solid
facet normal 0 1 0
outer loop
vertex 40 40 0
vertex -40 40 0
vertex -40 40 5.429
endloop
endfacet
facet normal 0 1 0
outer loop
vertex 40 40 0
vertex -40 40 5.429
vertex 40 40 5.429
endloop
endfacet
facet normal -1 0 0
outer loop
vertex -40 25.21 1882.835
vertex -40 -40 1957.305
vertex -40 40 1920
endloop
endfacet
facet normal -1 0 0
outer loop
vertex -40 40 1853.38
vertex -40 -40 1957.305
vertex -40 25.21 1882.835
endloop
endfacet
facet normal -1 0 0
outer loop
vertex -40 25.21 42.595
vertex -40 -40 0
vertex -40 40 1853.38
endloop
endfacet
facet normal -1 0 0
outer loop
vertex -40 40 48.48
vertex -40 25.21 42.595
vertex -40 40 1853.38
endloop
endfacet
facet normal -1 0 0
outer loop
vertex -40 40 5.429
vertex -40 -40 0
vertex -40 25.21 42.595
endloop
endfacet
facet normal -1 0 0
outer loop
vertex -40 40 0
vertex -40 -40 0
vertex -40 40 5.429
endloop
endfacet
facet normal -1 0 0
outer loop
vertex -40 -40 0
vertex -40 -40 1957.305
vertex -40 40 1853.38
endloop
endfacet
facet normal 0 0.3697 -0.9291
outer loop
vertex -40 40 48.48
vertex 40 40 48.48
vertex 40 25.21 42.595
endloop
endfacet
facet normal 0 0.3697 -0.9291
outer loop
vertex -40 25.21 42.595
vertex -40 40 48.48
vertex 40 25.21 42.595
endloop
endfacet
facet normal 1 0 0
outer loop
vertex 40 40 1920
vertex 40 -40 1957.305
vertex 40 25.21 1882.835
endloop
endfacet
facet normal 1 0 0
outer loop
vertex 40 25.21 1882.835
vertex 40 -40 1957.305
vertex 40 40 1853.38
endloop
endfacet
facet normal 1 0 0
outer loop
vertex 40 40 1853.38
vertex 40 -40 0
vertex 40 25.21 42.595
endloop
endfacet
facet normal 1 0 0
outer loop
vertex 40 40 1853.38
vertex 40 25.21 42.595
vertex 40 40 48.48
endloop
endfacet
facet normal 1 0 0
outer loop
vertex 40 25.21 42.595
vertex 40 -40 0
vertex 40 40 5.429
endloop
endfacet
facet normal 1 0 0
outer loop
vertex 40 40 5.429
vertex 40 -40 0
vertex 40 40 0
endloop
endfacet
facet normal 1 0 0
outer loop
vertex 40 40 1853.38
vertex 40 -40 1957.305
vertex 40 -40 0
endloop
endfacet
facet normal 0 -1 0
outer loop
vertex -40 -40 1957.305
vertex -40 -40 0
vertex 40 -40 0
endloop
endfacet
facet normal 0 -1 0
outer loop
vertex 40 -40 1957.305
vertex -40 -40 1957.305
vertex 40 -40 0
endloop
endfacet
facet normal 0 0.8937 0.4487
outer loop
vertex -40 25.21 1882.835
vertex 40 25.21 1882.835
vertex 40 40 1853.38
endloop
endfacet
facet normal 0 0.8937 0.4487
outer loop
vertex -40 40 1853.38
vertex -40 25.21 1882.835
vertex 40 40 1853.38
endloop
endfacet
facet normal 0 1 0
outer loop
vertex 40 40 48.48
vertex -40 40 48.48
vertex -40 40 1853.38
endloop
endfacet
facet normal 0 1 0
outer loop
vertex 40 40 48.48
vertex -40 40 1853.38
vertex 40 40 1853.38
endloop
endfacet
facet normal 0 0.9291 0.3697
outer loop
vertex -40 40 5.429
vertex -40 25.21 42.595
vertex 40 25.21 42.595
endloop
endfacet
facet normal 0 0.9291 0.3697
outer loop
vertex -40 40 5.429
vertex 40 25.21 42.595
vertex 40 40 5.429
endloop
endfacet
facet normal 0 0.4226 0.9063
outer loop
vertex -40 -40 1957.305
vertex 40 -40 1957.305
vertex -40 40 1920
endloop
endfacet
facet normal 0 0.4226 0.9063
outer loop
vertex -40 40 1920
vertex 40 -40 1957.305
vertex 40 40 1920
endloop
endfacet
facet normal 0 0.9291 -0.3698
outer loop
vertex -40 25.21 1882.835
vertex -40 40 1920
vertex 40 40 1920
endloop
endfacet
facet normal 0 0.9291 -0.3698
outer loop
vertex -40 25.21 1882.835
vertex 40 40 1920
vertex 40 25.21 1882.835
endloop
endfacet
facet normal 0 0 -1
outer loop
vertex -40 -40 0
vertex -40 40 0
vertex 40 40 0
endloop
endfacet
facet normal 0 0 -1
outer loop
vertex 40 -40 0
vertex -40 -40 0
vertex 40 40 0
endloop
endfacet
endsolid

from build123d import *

# Parameters (mm, degrees)
F0_W     = 80
F0_H     = 80
F1_DEPTH = 2000
F3_DEPTH = 80.001


with BuildPart() as f1:
    # F0 (on Top) → F1 (new body)
    with BuildSketch(Plane.XY):
        Rectangle(F0_W, F0_H)
    extrude(amount=F1_DEPTH)

    # F2 (on face) → F3 (cut, through all)
    with BuildSketch(Plane.YZ.offset(40)):
        Polygon((40, 1853.379992), (40, 1920), (25.21013, 1882.834697), align=None)
        Polygon((25.21013, 42.594697), (40, 5.429394), (40, 48.480301), align=None)
        Polygon((-40, 2000), (-40, 1957.304613), (40, 1920), (40, 2000), align=None)
    extrude(amount=-F3_DEPTH, mode=Mode.SUBTRACT)


solid = f1.part
